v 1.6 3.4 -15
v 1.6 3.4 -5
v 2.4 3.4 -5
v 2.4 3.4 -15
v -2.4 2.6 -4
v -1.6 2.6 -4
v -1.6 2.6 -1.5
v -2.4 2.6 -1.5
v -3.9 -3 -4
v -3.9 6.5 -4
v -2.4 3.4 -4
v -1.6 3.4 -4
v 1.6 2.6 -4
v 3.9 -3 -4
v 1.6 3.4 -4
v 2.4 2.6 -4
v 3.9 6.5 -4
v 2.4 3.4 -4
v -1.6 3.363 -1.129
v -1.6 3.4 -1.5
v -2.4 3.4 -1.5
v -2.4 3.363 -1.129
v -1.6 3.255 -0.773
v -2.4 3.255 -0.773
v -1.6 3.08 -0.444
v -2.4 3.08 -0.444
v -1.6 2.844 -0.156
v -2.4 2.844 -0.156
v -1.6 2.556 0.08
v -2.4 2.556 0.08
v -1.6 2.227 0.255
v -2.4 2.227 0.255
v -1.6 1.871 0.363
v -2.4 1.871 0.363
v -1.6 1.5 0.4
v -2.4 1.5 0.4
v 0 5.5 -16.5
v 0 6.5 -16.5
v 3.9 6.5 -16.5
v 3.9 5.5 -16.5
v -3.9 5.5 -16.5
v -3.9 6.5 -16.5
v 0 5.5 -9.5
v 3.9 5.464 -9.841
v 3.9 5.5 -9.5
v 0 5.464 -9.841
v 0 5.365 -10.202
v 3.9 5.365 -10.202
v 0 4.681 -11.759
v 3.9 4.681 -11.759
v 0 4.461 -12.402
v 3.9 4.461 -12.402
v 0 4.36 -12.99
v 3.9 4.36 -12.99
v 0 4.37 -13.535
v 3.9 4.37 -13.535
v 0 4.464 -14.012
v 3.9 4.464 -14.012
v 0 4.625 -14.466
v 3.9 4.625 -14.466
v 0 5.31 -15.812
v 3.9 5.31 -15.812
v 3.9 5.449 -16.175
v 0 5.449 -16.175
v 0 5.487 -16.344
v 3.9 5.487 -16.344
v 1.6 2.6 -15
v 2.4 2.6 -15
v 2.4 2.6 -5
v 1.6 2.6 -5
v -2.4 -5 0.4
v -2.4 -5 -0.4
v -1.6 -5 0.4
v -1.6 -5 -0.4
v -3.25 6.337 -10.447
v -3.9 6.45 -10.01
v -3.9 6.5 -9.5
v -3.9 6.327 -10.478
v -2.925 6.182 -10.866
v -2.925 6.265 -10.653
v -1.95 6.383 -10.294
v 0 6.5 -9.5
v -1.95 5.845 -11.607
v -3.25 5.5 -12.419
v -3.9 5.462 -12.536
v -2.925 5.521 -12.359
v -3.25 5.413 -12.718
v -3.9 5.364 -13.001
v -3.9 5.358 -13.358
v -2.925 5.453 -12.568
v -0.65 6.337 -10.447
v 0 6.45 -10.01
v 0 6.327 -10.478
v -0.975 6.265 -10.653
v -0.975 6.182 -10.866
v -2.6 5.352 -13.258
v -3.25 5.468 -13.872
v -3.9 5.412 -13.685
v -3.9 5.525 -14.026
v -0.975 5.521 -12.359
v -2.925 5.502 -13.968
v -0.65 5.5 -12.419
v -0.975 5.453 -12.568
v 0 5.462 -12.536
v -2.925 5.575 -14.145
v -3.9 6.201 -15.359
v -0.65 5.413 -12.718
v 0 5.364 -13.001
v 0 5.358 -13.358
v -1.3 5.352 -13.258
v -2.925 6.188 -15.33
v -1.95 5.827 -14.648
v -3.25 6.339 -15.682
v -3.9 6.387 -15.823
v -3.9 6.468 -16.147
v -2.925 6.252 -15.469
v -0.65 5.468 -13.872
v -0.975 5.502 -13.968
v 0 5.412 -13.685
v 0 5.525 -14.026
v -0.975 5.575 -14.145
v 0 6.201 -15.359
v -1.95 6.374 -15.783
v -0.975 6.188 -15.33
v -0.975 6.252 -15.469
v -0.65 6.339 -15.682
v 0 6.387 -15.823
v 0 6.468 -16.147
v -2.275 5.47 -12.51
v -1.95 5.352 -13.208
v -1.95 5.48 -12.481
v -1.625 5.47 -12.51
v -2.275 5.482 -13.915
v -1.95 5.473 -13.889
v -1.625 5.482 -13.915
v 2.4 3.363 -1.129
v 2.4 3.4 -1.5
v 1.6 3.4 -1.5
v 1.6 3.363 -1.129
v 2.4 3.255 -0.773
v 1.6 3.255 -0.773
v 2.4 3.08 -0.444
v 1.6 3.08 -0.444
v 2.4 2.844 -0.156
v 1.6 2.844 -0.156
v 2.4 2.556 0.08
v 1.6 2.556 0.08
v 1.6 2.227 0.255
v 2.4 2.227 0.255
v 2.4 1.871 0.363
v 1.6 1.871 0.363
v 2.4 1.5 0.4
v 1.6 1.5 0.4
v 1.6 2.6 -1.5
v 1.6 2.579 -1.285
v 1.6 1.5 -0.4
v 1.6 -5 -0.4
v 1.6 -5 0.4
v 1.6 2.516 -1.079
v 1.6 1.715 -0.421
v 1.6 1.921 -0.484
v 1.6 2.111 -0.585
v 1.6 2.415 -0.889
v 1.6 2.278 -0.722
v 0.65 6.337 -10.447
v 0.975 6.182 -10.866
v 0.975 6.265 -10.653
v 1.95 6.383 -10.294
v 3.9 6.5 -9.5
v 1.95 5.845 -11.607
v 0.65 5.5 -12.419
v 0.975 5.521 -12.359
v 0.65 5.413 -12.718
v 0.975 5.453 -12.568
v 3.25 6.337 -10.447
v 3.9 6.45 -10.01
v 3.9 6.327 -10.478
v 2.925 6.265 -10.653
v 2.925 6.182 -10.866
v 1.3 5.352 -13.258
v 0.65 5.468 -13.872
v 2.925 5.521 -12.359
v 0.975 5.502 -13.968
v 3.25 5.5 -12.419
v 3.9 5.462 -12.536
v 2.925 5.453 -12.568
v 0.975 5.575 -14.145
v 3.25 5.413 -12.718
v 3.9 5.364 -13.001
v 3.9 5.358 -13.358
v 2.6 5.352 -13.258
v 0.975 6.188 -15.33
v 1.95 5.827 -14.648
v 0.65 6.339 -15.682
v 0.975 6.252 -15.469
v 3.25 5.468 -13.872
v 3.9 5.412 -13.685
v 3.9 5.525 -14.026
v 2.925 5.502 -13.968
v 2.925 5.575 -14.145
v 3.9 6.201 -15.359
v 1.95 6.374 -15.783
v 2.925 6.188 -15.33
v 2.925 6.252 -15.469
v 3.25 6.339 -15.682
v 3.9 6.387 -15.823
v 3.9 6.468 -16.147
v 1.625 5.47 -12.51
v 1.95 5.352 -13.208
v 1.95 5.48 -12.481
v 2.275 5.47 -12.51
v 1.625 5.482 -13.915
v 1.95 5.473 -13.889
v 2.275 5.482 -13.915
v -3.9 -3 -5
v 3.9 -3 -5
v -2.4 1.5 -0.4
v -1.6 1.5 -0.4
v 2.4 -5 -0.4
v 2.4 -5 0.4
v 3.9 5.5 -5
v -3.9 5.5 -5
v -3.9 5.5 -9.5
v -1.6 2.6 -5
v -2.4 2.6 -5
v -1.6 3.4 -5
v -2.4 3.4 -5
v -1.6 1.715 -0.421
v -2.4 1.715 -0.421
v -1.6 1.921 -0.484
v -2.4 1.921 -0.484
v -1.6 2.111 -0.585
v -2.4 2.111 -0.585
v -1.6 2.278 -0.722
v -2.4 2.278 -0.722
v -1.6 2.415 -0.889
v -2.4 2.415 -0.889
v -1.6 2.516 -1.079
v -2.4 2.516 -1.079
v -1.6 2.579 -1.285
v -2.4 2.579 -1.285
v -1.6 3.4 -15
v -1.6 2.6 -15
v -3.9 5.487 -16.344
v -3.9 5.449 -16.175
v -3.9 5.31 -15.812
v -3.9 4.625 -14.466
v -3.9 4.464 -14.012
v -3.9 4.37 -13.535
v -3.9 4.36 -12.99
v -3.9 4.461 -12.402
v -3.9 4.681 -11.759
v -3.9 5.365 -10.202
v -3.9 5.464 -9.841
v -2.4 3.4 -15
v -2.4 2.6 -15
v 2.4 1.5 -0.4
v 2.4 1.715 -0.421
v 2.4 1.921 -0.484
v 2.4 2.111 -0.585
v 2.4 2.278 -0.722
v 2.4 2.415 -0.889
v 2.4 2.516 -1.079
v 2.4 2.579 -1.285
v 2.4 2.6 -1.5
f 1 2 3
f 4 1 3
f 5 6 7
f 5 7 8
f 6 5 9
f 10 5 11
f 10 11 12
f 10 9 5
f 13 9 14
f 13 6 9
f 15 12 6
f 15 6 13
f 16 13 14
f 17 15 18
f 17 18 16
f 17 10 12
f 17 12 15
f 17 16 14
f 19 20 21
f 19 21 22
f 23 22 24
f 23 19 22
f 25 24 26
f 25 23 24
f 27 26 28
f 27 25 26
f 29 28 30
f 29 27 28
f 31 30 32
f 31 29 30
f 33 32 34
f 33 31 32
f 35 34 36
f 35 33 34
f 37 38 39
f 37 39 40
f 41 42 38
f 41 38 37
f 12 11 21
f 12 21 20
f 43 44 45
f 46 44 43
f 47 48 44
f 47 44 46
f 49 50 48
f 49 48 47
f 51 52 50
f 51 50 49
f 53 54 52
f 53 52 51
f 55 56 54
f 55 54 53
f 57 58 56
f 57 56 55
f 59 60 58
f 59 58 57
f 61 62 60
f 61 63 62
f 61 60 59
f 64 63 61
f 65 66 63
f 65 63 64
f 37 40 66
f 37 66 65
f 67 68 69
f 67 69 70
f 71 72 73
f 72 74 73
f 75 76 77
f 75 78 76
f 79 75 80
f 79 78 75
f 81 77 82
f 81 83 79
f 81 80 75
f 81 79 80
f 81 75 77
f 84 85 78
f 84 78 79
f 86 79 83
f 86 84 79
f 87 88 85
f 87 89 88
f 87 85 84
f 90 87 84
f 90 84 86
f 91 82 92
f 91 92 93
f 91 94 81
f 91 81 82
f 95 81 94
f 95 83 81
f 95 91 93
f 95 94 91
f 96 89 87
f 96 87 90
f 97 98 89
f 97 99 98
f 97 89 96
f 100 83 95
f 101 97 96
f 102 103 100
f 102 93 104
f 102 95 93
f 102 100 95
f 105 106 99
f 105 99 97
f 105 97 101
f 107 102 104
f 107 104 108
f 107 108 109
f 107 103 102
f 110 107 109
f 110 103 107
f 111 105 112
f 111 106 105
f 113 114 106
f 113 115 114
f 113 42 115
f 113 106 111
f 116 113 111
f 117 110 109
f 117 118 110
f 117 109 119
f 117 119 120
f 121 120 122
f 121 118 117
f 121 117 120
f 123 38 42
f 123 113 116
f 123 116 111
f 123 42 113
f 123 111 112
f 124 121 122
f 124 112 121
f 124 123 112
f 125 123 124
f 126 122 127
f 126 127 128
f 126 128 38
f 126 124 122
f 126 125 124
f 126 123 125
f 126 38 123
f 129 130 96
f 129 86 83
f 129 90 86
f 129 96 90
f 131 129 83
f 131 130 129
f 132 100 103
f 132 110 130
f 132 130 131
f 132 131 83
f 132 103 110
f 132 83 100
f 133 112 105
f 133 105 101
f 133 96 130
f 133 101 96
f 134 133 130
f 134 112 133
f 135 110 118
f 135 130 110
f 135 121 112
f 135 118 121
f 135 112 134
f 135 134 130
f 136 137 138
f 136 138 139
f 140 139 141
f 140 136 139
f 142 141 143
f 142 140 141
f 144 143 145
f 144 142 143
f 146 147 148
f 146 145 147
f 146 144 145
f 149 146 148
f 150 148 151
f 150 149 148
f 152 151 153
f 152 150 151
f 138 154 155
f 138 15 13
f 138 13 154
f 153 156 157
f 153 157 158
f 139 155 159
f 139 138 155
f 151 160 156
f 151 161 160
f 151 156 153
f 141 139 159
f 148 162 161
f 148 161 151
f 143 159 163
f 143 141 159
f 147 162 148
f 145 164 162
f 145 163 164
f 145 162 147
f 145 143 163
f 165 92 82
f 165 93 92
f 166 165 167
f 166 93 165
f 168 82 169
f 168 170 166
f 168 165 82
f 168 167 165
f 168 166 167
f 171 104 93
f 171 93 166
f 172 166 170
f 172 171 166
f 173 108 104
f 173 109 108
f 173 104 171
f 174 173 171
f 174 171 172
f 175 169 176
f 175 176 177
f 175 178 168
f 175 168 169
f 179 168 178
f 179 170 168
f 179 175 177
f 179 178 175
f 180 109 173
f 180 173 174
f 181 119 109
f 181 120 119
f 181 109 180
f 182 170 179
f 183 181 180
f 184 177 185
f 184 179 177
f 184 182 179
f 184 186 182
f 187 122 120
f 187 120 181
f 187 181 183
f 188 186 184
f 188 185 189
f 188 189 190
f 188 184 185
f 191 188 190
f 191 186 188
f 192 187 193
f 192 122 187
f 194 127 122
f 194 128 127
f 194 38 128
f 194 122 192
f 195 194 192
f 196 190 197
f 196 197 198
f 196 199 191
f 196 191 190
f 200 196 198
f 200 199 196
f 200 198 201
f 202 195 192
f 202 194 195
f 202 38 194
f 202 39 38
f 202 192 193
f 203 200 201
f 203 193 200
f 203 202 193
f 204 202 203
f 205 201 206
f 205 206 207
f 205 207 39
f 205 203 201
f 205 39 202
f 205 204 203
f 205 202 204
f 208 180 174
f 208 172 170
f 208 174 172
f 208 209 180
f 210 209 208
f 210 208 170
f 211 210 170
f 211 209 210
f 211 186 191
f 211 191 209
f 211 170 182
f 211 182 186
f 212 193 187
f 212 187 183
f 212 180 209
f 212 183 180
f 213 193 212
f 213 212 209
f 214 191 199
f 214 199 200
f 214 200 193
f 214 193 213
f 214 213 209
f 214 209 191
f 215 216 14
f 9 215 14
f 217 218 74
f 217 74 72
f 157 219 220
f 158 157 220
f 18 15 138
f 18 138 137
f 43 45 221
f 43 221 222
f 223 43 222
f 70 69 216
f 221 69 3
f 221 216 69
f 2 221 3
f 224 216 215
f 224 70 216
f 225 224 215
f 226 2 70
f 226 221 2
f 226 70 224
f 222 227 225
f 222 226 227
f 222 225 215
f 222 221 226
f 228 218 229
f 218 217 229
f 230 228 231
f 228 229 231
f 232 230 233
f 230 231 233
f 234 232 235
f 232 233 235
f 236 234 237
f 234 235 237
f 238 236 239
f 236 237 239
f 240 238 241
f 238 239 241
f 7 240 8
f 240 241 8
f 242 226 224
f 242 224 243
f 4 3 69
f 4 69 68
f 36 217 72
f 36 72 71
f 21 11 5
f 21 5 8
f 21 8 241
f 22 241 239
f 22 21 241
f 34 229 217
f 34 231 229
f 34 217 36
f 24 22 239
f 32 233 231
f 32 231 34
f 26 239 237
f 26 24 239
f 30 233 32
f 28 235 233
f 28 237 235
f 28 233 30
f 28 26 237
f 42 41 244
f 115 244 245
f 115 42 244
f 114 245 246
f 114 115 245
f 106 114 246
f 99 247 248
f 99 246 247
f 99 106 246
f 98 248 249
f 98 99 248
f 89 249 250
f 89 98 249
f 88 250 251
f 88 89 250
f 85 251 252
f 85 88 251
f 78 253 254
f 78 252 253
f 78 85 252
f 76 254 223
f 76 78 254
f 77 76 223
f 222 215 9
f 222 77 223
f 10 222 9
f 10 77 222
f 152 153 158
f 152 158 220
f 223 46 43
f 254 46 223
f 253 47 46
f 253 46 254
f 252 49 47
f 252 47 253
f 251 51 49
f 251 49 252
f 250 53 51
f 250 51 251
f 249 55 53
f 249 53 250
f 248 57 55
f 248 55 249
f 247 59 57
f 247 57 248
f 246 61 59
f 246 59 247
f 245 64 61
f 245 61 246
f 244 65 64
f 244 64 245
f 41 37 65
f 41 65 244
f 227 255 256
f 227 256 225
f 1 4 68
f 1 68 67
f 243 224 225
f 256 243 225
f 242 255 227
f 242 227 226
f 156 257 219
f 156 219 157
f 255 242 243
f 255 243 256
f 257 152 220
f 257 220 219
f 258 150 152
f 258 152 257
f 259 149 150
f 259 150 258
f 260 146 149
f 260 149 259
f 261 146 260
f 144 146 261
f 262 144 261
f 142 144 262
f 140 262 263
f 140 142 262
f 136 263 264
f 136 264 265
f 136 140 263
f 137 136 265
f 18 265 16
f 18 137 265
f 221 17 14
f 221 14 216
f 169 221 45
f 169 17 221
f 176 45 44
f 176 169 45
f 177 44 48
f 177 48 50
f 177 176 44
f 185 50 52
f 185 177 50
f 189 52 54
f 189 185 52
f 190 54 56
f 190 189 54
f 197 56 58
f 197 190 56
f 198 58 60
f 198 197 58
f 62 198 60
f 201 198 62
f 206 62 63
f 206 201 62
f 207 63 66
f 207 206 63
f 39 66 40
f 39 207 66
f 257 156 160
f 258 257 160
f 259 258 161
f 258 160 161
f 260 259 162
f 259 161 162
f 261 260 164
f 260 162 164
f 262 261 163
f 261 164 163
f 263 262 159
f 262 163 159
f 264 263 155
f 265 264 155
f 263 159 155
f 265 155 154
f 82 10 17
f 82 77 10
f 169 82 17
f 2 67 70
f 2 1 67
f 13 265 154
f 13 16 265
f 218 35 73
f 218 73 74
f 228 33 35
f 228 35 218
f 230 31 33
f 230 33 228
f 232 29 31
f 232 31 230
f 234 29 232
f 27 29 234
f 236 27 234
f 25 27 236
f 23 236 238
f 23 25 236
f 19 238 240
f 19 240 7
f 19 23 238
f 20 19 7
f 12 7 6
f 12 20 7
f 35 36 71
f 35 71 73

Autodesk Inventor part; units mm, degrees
ref_plane "YZ Plane" through (0, 0, 0) normal (1, 0, 0) x (0, 1, 0)
sketch "Эскиз1" plane through (0, 0, 0) normal (1, 0, 0) x (0, 1, 0)
  line L0 (-3, -4.5) -> (6, -4.5)
  line L1 (0, -19.9641) -> (0, 3.794) projected
  line L2 (-7.2118, 0) -> (8.271, 0) projected
  line L3 (6, -4.5) -> (6, -9.5)
  line L4 (6, -9.5) -> (6, -11.6158) construction
  line L5 (6, -11.6158) -> (2.9383, -13.3469) construction
  line L6 (2.9383, -13.3469) -> (6, -14.7108) construction
  line L7 (6, -14.7108) -> (6, -16.5) construction
  spline S0 degree 4 poles (6, -9.5) (6, -11.6158) (2.9383, -13.3469) (6, -14.7108) (6, -16.5) knots 1 1 1 1 1 2 2 2 2 2
  line L8 (-5, 0) -> (1.5, 0)
  line L9 (3, -1.5) -> (3, -15)
  arc A0 (3, -1.5) -> (1.5, 0) centre (1.5, -1.5) ccw
  point P0 (0, 0)
  dimension "d0" = 9
  dimension "d1" = 3
  dimension "d2" = 4.5
  dimension "d3" = 5
  dimension "d4" = 12
  dimension "d5" = 7
  dimension "d7" = 3
  dimension "d9" = 3
  dimension "d11" = 15
  dimension "d12" = 8
ref_plane "РабПлоскость1" through (0, -5, 0) normal (0, 1, 0) x (-1, 0, 0)
ref_plane "РабПлоскость2" through (0, -3, 0) normal (0, 1, 0) x (-1, 0, 0)
sketch "Эскиз2" plane through (0, -3, 0) normal (0, 1, 0) x (-1, 0, 0)
  line L0 (-3.9, -4) -> (3.9, -4)
  line L1 (3.9, -4) -> (3.9, -5)
  line L2 (3.9, -5) -> (-3.9, -5)
  line L3 (-3.9, -5) -> (-3.9, -4)
  line L4 (0, -5.48) -> (0, 1.38) projected
  line L5 (0, -4.5) -> (1.03, -4.5)
  point P0 (0, 0)
  dimension "d15" = 7.8
  dimension "d16" = 1
sweep "Сдвиг1" add profiles "Эскиз2" path "Эскиз1" path curves L0 L3 S0
sketch "Эскиз3" plane through (0, -5, 0) normal (0, 1, 0) x (-1, 0, 0)
  line L0 (3.36, 0) -> (-3.36, 0) projected
  line L1 (0, -0.56) -> (0, 0.56) projected
  line L2 (2.4, 0.4) -> (1.6, 0.4)
  line L3 (1.6, 0.4) -> (1.6, -0.4)
  line L4 (1.6, -0.4) -> (2.4, -0.4)
  line L5 (2.4, -0.4) -> (2.4, 0.4)
  line L6 (-1.6, 0.4) -> (-2.4, 0.4)
  line L7 (-2.4, 0.4) -> (-2.4, -0.4)
  line L8 (-2.4, -0.4) -> (-1.6, -0.4)
  line L9 (-1.6, -0.4) -> (-1.6, 0.4)
  point P0 (0, 0)
  dimension "d22" = 0.8
  dimension "d23" = 0.8
  dimension "d24" = 0.8
  dimension "d25" = 0.8
  dimension "d26" = 4
sweep "Сдвиг2" add profiles "Эскиз3" path "Эскиз1" path curves L8 A0 L9
sketch "Эскиз4" plane through (0, 0, 0) normal (0, 1, 0) x (-1, 0, 0)
  line L0 (2.4, 0.4) -> (1.6, 0.4) projected
  line L1 (2.4, -0.4) -> (2.4, 0.4) projected
  line L2 (1.6, -0.4) -> (2.4, -0.4) projected
  line L3 (1.6, 0.4) -> (1.6, -0.4) projected
  line L4 (-1.6, 0.4) -> (-2.4, 0.4) projected
  line L5 (-1.6, -0.4) -> (-1.6, 0.4) projected
  line L6 (-2.4, -0.4) -> (-1.6, -0.4) projected
  line L7 (-2.4, 0.4) -> (-2.4, -0.4) projected
  line L8 (2.4, 0.4) -> (1.6, 0.4) projected
  line L9 (1.6, 0.4) -> (1.6, -0.4) projected
  line L10 (1.6, -0.4) -> (2.4, -0.4) projected
  line L11 (2.4, -0.4) -> (2.4, 0.4) projected
  line L12 (-2.4, -0.4) -> (-1.6, -0.4) projected
  line L13 (-1.6, -0.4) -> (-1.6, 0.4) projected
  line L14 (-1.6, 0.4) -> (-2.4, 0.4) projected
  line L15 (-2.4, 0.4) -> (-2.4, -0.4) projected
  circle A0 centre (-2, 0) radius 0.5657
  point P0 (0, 0)
properties part number "conn_sensor"
